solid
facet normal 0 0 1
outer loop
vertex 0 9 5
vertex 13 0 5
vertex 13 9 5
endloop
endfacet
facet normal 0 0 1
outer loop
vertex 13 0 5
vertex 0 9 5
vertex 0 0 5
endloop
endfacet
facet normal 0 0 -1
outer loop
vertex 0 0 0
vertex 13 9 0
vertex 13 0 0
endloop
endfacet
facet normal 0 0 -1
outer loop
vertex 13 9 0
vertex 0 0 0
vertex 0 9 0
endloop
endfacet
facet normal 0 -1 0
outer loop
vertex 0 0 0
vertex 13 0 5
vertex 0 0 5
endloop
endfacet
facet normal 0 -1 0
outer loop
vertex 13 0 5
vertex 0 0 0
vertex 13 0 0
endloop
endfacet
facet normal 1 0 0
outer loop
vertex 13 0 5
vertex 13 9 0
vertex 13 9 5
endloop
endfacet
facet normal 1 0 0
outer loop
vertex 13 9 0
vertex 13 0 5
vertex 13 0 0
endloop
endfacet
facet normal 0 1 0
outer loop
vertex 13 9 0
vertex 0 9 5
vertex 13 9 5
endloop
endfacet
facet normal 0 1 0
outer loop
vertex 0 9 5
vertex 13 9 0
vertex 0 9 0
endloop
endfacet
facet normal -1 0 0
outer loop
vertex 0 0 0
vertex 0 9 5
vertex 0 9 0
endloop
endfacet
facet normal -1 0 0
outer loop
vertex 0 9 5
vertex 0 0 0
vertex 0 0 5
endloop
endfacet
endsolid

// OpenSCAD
// Generated by SolidPython 1.0.1 on 2020-07-29 00:46:55


cube(size = [13, 9, 5]);
/***********************************************
*********      SolidPython code:      **********
************************************************
 
# import packages: SolidPython
from solid import *
from solid.utils import *
from itertools import chain, combinations, permutations


class Resize:

    def __init__(self, scad_file):
        self.scad_file = scad_file
        #self.scad_file = import_scad(scad_file)
        # cone/cylinder param:
        self.r1 = 0
        self.r2 = 0
        self.h = 0
        # rectangular prism param:
        self.w = 0
        self.l = 0
        # ellipse param:
        self.r = 0

    # import OpenScad code (file name corresponds to shape)


    # classify shape + parameters
    def assign(self, param1, param2, param3):
        if self.scad_file == 'cone.scad':
            self.r1 = param1
            self.r2 = param2
            self.h = param3
        elif self.scad_file == 'cylinder.scad':
            self.r1 = param1
            self.r2 = param2
            self.h = param3
        elif self.scad_file == 'rectangularPrism.scad':
            self.h = param1
            self.l = param2
            self.w = param3
        else:
            self.r = param1
            self.h = param2

    # resize parameters
    def iterate(self):
        x = range(3, 20, 2)
        i = 1
        if self.scad_file == 'cone.scad':
            tempList = list(permutations(x, 2))
            for temp in tempList:
                param1 = temp[0]
                param2 = temp[1]
                filepath = 'produced_scad_files/' + 'cone' + str(param1) + '_' + str(param2) + '_' + '.scad'
                scad_render_to_file(cylinder(h=param1, r1=param2, r2=0), filepath)

        elif self.scad_file == 'cylinder.scad':
            tempList = list(permutations(x, 3))
            for temp in tempList:
                param1 = temp[0]
                param2 = temp[1]
                filepath = 'produced_scad_files/' + 'cylinder' + str(param1) + '_' + str(param2) + '_' + '.scad'
                scad_render_to_file(cylinder(h=param1, r1=param2, r2=param2), filepath)

        elif self.scad_file == 'rectangularPrism.scad':
            tempList = list(permutations(x, 3))
            for temp in tempList:
                param1 = temp[0]
                param2 = temp[1]
                param3 = temp[2]
                filepath = 'produced_scad_files/' + 'rectangularPrism' + str(param1) + '_' + str(param2) + '_' + str(
                    param3) + '.scad'
                scad_render_to_file(cube(size=(param1, param2, param3)), filepath)

        elif self.scad_file == 'ellipse.scad':
            tempList = list(permutations(x, 4))
            for temp in tempList:
                param1 = temp[0]
                param2 = temp[1]
                param3 = temp[2]
                param4 = temp[3]
                filepath = 'produced_scad_files/' + 'ellipse' + str(param1) + '_' + str(param2) + '_' + str(param3) + '_' + str(param4) + '.scad'
                scad_render_to_file(scale([param1, param2, param3])(sphere(r=param4)), filepath)

    def render_to_scadfile(self):
        scad_render_to_file(scad, 'example.scad') 
 
************************************************/
